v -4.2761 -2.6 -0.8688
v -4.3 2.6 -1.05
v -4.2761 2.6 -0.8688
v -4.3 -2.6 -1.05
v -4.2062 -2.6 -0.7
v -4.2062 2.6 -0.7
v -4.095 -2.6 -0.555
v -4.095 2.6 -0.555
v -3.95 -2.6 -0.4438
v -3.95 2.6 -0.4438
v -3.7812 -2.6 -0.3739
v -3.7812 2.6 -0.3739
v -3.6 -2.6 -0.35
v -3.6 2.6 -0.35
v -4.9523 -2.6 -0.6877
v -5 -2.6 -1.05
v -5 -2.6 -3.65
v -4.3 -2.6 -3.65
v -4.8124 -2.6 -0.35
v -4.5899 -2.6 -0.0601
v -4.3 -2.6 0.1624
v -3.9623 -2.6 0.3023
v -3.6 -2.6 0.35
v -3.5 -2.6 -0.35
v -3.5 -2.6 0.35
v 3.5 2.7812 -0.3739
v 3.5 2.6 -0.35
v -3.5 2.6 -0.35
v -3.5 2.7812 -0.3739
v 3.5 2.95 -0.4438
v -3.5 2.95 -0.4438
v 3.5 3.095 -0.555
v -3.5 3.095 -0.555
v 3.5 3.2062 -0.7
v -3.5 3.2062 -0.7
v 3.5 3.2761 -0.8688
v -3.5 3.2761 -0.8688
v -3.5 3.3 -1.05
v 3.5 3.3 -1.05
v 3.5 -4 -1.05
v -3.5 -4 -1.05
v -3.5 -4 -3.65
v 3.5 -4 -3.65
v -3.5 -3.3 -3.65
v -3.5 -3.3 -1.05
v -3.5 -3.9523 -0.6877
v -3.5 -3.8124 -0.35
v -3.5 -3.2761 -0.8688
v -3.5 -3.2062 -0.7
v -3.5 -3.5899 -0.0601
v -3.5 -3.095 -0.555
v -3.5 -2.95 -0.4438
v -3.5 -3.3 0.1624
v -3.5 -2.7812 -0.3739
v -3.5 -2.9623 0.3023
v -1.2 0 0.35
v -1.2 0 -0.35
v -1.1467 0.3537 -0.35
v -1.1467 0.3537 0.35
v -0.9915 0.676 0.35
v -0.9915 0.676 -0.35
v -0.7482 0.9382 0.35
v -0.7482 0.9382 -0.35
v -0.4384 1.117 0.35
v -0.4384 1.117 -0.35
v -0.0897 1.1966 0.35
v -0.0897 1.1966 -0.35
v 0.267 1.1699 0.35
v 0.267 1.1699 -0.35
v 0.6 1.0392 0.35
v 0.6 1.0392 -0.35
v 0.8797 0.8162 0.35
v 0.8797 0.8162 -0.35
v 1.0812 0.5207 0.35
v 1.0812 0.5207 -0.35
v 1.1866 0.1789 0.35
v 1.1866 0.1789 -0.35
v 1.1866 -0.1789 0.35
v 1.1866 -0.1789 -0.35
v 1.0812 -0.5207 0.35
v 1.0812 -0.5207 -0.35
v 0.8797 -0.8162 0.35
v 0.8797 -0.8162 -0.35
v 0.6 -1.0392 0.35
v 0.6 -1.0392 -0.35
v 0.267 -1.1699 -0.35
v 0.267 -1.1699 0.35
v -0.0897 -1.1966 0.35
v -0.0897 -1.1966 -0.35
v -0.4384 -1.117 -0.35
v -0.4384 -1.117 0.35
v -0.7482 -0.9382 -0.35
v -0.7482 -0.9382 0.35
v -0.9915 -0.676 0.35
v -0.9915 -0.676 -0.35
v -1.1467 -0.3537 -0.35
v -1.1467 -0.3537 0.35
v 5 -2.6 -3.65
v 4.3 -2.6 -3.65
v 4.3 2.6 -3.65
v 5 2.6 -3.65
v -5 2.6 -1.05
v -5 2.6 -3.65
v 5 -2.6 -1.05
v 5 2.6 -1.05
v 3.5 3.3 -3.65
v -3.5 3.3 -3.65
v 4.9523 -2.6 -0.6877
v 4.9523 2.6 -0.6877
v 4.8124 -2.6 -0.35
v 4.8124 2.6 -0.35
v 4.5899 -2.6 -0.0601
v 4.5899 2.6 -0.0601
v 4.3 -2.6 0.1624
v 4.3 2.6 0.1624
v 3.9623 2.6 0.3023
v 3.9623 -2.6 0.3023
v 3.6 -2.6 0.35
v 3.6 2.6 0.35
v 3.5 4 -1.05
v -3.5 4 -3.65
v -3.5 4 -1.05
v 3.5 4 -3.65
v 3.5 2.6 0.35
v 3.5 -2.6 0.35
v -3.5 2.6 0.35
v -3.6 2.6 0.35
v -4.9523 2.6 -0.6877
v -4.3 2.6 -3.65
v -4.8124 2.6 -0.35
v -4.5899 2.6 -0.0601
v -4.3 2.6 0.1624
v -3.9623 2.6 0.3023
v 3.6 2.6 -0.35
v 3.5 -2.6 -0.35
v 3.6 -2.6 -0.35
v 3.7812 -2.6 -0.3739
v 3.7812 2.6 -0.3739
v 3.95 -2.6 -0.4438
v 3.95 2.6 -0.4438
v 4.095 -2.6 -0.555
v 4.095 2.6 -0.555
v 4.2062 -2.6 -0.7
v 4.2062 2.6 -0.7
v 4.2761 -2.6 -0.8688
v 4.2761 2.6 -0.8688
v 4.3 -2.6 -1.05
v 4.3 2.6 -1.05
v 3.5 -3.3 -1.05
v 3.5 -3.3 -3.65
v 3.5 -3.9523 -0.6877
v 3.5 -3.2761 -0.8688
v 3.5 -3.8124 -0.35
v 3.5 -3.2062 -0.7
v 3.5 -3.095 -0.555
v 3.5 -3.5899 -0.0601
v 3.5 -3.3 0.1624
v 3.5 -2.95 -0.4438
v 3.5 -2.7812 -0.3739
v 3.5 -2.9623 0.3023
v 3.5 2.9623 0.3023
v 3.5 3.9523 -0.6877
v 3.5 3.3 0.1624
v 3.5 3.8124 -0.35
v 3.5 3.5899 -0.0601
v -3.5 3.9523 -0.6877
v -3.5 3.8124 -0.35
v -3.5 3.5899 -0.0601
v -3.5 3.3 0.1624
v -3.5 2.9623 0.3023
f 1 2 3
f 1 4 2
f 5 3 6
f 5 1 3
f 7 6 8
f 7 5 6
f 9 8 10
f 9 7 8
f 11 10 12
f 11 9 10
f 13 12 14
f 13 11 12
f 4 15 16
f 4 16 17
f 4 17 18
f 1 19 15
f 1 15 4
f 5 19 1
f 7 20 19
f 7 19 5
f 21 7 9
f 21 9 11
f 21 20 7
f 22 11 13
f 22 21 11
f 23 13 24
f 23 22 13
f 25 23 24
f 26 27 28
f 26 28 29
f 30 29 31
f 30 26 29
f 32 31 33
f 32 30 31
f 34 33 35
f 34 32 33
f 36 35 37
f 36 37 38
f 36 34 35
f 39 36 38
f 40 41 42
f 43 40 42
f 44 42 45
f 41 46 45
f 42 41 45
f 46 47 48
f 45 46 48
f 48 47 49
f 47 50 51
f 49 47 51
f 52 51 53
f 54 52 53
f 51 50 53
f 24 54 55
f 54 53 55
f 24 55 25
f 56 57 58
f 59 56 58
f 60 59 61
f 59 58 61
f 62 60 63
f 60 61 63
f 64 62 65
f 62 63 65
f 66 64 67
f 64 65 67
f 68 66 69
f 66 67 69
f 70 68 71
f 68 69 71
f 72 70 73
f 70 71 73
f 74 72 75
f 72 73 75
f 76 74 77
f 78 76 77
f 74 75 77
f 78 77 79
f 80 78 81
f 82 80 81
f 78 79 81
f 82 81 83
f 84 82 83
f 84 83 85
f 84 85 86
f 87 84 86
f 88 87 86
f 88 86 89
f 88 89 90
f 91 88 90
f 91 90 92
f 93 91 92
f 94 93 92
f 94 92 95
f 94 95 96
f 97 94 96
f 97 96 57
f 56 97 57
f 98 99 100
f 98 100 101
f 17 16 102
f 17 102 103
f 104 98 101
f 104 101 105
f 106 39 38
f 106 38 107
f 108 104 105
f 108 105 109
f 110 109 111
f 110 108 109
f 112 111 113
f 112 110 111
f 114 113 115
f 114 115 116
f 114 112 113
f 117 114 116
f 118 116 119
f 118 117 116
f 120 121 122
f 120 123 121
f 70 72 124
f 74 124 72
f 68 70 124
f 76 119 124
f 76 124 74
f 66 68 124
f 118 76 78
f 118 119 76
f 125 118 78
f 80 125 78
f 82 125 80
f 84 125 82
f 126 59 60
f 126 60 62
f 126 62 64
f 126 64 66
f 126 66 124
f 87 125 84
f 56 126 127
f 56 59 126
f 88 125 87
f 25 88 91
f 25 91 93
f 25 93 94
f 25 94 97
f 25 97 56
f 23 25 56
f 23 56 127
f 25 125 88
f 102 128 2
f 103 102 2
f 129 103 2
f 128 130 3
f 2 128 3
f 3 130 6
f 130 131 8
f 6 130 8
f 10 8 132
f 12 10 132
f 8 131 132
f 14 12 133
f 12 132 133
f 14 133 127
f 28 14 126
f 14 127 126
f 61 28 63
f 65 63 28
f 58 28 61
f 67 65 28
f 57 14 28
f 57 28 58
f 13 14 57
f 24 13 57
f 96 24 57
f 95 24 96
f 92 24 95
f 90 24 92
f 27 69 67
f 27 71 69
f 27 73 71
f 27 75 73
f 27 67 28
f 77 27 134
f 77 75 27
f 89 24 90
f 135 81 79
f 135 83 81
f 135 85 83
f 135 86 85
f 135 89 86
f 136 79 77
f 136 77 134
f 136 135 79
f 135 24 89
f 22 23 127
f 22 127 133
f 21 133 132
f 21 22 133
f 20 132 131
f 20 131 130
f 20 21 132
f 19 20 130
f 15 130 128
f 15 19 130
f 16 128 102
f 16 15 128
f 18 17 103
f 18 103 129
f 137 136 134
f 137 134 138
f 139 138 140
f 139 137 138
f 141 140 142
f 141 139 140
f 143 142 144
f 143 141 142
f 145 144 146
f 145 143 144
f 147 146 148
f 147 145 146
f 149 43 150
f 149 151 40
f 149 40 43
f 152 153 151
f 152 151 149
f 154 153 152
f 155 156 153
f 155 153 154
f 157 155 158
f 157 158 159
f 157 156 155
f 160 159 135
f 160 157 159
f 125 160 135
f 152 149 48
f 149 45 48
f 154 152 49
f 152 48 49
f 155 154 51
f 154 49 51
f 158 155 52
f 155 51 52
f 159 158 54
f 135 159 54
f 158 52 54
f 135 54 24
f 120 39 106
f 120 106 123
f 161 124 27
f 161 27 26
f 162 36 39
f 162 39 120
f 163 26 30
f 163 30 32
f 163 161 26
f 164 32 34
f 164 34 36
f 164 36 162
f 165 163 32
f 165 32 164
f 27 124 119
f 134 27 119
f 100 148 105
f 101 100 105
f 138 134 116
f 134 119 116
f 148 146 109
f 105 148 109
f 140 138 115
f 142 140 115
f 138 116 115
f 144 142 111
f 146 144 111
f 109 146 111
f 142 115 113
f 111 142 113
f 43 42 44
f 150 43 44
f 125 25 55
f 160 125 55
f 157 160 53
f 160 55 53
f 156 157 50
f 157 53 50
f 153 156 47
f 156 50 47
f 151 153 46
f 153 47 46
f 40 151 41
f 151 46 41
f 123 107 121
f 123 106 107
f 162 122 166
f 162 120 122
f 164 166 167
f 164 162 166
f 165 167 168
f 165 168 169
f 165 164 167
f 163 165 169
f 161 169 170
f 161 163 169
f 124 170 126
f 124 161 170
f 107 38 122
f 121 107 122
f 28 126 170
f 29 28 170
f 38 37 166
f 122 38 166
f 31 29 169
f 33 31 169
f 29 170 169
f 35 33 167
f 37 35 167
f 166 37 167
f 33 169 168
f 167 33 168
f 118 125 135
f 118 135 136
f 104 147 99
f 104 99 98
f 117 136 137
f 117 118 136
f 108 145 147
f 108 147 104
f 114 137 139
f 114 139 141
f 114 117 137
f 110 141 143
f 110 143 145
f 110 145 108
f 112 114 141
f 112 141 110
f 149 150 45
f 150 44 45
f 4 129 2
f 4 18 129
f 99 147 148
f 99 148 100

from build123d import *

# Parameters (mm, degrees)
F1_DEPTH = 2.6
F3_DEPTH = 3.5
F5_D     = 2.4


with BuildPart() as f1:
    # F0 (on Front) → F1 (new body, symmetric)
    with BuildSketch(Plane.XZ):
        with BuildLine():
            Line((-3.6, -0.35), (3.6, -0.35))
            ThreePointArc((3.6, -0.35), (4.0949747468, -0.5550252532), (4.3, -1.05))
            Line((4.3, -1.05), (4.3, -3.65))
            Line((4.3, -3.65), (5, -3.65))
            Line((5, -3.65), (5, -1.05))
            ThreePointArc((5, -1.05), (4.5899494937, -0.0600505063), (3.6, 0.35))
            Line((3.6, 0.35), (-3.6, 0.35))
            ThreePointArc((-3.6, 0.35), (-4.5899494937, -0.0600505063), (-5, -1.05))
            Line((-5, -1.05), (-5, -3.65))
            Line((-5, -3.65), (-4.3, -3.65))
            Line((-4.3, -3.65), (-4.3, -1.05))
            ThreePointArc((-4.3, -1.05), (-4.0949747468, -0.5550252532), (-3.6, -0.35))
        make_face()
    extrude(amount=F1_DEPTH, both=True)

    # F2 (on Right) → F3 (join, symmetric)
    with BuildSketch(Plane.YZ):
        with BuildLine():
            Line((-4, -3.65), (-3.3, -3.65))
            Line((-3.3, -3.65), (-3.3, -1.05))
            ThreePointArc((-3.3, -1.05), (-3.0949747468, -0.5550252532), (-2.6, -0.35))
            Line((-2.6, -0.35), (-2.6, 0.35))
            ThreePointArc((-2.6, 0.35), (-3.5899494937, -0.0600505063), (-4, -1.05))
            Line((-4, -1.05), (-4, -3.65))
        make_face()
        with BuildLine():
            ThreePointArc((4, -1.05), (3.5899494937, -0.0600505063), (2.6, 0.35))
            Line((2.6, 0.35), (2.6, -0.35))
            ThreePointArc((2.6, -0.35), (3.0949747468, -0.5550252532), (3.3, -1.05))
            Line((3.3, -1.05), (3.3, -3.65))
            Line((3.3, -3.65), (4, -3.65))
            Line((4, -3.65), (4, -1.05))
        make_face()
    extrude(amount=F3_DEPTH, both=True)

    # F5 (through all)
    with Locations(Plane.XY.offset(0.35)):
        with Locations((0, 0)):
            Hole(F5_D / 2)


solid = f1.part
